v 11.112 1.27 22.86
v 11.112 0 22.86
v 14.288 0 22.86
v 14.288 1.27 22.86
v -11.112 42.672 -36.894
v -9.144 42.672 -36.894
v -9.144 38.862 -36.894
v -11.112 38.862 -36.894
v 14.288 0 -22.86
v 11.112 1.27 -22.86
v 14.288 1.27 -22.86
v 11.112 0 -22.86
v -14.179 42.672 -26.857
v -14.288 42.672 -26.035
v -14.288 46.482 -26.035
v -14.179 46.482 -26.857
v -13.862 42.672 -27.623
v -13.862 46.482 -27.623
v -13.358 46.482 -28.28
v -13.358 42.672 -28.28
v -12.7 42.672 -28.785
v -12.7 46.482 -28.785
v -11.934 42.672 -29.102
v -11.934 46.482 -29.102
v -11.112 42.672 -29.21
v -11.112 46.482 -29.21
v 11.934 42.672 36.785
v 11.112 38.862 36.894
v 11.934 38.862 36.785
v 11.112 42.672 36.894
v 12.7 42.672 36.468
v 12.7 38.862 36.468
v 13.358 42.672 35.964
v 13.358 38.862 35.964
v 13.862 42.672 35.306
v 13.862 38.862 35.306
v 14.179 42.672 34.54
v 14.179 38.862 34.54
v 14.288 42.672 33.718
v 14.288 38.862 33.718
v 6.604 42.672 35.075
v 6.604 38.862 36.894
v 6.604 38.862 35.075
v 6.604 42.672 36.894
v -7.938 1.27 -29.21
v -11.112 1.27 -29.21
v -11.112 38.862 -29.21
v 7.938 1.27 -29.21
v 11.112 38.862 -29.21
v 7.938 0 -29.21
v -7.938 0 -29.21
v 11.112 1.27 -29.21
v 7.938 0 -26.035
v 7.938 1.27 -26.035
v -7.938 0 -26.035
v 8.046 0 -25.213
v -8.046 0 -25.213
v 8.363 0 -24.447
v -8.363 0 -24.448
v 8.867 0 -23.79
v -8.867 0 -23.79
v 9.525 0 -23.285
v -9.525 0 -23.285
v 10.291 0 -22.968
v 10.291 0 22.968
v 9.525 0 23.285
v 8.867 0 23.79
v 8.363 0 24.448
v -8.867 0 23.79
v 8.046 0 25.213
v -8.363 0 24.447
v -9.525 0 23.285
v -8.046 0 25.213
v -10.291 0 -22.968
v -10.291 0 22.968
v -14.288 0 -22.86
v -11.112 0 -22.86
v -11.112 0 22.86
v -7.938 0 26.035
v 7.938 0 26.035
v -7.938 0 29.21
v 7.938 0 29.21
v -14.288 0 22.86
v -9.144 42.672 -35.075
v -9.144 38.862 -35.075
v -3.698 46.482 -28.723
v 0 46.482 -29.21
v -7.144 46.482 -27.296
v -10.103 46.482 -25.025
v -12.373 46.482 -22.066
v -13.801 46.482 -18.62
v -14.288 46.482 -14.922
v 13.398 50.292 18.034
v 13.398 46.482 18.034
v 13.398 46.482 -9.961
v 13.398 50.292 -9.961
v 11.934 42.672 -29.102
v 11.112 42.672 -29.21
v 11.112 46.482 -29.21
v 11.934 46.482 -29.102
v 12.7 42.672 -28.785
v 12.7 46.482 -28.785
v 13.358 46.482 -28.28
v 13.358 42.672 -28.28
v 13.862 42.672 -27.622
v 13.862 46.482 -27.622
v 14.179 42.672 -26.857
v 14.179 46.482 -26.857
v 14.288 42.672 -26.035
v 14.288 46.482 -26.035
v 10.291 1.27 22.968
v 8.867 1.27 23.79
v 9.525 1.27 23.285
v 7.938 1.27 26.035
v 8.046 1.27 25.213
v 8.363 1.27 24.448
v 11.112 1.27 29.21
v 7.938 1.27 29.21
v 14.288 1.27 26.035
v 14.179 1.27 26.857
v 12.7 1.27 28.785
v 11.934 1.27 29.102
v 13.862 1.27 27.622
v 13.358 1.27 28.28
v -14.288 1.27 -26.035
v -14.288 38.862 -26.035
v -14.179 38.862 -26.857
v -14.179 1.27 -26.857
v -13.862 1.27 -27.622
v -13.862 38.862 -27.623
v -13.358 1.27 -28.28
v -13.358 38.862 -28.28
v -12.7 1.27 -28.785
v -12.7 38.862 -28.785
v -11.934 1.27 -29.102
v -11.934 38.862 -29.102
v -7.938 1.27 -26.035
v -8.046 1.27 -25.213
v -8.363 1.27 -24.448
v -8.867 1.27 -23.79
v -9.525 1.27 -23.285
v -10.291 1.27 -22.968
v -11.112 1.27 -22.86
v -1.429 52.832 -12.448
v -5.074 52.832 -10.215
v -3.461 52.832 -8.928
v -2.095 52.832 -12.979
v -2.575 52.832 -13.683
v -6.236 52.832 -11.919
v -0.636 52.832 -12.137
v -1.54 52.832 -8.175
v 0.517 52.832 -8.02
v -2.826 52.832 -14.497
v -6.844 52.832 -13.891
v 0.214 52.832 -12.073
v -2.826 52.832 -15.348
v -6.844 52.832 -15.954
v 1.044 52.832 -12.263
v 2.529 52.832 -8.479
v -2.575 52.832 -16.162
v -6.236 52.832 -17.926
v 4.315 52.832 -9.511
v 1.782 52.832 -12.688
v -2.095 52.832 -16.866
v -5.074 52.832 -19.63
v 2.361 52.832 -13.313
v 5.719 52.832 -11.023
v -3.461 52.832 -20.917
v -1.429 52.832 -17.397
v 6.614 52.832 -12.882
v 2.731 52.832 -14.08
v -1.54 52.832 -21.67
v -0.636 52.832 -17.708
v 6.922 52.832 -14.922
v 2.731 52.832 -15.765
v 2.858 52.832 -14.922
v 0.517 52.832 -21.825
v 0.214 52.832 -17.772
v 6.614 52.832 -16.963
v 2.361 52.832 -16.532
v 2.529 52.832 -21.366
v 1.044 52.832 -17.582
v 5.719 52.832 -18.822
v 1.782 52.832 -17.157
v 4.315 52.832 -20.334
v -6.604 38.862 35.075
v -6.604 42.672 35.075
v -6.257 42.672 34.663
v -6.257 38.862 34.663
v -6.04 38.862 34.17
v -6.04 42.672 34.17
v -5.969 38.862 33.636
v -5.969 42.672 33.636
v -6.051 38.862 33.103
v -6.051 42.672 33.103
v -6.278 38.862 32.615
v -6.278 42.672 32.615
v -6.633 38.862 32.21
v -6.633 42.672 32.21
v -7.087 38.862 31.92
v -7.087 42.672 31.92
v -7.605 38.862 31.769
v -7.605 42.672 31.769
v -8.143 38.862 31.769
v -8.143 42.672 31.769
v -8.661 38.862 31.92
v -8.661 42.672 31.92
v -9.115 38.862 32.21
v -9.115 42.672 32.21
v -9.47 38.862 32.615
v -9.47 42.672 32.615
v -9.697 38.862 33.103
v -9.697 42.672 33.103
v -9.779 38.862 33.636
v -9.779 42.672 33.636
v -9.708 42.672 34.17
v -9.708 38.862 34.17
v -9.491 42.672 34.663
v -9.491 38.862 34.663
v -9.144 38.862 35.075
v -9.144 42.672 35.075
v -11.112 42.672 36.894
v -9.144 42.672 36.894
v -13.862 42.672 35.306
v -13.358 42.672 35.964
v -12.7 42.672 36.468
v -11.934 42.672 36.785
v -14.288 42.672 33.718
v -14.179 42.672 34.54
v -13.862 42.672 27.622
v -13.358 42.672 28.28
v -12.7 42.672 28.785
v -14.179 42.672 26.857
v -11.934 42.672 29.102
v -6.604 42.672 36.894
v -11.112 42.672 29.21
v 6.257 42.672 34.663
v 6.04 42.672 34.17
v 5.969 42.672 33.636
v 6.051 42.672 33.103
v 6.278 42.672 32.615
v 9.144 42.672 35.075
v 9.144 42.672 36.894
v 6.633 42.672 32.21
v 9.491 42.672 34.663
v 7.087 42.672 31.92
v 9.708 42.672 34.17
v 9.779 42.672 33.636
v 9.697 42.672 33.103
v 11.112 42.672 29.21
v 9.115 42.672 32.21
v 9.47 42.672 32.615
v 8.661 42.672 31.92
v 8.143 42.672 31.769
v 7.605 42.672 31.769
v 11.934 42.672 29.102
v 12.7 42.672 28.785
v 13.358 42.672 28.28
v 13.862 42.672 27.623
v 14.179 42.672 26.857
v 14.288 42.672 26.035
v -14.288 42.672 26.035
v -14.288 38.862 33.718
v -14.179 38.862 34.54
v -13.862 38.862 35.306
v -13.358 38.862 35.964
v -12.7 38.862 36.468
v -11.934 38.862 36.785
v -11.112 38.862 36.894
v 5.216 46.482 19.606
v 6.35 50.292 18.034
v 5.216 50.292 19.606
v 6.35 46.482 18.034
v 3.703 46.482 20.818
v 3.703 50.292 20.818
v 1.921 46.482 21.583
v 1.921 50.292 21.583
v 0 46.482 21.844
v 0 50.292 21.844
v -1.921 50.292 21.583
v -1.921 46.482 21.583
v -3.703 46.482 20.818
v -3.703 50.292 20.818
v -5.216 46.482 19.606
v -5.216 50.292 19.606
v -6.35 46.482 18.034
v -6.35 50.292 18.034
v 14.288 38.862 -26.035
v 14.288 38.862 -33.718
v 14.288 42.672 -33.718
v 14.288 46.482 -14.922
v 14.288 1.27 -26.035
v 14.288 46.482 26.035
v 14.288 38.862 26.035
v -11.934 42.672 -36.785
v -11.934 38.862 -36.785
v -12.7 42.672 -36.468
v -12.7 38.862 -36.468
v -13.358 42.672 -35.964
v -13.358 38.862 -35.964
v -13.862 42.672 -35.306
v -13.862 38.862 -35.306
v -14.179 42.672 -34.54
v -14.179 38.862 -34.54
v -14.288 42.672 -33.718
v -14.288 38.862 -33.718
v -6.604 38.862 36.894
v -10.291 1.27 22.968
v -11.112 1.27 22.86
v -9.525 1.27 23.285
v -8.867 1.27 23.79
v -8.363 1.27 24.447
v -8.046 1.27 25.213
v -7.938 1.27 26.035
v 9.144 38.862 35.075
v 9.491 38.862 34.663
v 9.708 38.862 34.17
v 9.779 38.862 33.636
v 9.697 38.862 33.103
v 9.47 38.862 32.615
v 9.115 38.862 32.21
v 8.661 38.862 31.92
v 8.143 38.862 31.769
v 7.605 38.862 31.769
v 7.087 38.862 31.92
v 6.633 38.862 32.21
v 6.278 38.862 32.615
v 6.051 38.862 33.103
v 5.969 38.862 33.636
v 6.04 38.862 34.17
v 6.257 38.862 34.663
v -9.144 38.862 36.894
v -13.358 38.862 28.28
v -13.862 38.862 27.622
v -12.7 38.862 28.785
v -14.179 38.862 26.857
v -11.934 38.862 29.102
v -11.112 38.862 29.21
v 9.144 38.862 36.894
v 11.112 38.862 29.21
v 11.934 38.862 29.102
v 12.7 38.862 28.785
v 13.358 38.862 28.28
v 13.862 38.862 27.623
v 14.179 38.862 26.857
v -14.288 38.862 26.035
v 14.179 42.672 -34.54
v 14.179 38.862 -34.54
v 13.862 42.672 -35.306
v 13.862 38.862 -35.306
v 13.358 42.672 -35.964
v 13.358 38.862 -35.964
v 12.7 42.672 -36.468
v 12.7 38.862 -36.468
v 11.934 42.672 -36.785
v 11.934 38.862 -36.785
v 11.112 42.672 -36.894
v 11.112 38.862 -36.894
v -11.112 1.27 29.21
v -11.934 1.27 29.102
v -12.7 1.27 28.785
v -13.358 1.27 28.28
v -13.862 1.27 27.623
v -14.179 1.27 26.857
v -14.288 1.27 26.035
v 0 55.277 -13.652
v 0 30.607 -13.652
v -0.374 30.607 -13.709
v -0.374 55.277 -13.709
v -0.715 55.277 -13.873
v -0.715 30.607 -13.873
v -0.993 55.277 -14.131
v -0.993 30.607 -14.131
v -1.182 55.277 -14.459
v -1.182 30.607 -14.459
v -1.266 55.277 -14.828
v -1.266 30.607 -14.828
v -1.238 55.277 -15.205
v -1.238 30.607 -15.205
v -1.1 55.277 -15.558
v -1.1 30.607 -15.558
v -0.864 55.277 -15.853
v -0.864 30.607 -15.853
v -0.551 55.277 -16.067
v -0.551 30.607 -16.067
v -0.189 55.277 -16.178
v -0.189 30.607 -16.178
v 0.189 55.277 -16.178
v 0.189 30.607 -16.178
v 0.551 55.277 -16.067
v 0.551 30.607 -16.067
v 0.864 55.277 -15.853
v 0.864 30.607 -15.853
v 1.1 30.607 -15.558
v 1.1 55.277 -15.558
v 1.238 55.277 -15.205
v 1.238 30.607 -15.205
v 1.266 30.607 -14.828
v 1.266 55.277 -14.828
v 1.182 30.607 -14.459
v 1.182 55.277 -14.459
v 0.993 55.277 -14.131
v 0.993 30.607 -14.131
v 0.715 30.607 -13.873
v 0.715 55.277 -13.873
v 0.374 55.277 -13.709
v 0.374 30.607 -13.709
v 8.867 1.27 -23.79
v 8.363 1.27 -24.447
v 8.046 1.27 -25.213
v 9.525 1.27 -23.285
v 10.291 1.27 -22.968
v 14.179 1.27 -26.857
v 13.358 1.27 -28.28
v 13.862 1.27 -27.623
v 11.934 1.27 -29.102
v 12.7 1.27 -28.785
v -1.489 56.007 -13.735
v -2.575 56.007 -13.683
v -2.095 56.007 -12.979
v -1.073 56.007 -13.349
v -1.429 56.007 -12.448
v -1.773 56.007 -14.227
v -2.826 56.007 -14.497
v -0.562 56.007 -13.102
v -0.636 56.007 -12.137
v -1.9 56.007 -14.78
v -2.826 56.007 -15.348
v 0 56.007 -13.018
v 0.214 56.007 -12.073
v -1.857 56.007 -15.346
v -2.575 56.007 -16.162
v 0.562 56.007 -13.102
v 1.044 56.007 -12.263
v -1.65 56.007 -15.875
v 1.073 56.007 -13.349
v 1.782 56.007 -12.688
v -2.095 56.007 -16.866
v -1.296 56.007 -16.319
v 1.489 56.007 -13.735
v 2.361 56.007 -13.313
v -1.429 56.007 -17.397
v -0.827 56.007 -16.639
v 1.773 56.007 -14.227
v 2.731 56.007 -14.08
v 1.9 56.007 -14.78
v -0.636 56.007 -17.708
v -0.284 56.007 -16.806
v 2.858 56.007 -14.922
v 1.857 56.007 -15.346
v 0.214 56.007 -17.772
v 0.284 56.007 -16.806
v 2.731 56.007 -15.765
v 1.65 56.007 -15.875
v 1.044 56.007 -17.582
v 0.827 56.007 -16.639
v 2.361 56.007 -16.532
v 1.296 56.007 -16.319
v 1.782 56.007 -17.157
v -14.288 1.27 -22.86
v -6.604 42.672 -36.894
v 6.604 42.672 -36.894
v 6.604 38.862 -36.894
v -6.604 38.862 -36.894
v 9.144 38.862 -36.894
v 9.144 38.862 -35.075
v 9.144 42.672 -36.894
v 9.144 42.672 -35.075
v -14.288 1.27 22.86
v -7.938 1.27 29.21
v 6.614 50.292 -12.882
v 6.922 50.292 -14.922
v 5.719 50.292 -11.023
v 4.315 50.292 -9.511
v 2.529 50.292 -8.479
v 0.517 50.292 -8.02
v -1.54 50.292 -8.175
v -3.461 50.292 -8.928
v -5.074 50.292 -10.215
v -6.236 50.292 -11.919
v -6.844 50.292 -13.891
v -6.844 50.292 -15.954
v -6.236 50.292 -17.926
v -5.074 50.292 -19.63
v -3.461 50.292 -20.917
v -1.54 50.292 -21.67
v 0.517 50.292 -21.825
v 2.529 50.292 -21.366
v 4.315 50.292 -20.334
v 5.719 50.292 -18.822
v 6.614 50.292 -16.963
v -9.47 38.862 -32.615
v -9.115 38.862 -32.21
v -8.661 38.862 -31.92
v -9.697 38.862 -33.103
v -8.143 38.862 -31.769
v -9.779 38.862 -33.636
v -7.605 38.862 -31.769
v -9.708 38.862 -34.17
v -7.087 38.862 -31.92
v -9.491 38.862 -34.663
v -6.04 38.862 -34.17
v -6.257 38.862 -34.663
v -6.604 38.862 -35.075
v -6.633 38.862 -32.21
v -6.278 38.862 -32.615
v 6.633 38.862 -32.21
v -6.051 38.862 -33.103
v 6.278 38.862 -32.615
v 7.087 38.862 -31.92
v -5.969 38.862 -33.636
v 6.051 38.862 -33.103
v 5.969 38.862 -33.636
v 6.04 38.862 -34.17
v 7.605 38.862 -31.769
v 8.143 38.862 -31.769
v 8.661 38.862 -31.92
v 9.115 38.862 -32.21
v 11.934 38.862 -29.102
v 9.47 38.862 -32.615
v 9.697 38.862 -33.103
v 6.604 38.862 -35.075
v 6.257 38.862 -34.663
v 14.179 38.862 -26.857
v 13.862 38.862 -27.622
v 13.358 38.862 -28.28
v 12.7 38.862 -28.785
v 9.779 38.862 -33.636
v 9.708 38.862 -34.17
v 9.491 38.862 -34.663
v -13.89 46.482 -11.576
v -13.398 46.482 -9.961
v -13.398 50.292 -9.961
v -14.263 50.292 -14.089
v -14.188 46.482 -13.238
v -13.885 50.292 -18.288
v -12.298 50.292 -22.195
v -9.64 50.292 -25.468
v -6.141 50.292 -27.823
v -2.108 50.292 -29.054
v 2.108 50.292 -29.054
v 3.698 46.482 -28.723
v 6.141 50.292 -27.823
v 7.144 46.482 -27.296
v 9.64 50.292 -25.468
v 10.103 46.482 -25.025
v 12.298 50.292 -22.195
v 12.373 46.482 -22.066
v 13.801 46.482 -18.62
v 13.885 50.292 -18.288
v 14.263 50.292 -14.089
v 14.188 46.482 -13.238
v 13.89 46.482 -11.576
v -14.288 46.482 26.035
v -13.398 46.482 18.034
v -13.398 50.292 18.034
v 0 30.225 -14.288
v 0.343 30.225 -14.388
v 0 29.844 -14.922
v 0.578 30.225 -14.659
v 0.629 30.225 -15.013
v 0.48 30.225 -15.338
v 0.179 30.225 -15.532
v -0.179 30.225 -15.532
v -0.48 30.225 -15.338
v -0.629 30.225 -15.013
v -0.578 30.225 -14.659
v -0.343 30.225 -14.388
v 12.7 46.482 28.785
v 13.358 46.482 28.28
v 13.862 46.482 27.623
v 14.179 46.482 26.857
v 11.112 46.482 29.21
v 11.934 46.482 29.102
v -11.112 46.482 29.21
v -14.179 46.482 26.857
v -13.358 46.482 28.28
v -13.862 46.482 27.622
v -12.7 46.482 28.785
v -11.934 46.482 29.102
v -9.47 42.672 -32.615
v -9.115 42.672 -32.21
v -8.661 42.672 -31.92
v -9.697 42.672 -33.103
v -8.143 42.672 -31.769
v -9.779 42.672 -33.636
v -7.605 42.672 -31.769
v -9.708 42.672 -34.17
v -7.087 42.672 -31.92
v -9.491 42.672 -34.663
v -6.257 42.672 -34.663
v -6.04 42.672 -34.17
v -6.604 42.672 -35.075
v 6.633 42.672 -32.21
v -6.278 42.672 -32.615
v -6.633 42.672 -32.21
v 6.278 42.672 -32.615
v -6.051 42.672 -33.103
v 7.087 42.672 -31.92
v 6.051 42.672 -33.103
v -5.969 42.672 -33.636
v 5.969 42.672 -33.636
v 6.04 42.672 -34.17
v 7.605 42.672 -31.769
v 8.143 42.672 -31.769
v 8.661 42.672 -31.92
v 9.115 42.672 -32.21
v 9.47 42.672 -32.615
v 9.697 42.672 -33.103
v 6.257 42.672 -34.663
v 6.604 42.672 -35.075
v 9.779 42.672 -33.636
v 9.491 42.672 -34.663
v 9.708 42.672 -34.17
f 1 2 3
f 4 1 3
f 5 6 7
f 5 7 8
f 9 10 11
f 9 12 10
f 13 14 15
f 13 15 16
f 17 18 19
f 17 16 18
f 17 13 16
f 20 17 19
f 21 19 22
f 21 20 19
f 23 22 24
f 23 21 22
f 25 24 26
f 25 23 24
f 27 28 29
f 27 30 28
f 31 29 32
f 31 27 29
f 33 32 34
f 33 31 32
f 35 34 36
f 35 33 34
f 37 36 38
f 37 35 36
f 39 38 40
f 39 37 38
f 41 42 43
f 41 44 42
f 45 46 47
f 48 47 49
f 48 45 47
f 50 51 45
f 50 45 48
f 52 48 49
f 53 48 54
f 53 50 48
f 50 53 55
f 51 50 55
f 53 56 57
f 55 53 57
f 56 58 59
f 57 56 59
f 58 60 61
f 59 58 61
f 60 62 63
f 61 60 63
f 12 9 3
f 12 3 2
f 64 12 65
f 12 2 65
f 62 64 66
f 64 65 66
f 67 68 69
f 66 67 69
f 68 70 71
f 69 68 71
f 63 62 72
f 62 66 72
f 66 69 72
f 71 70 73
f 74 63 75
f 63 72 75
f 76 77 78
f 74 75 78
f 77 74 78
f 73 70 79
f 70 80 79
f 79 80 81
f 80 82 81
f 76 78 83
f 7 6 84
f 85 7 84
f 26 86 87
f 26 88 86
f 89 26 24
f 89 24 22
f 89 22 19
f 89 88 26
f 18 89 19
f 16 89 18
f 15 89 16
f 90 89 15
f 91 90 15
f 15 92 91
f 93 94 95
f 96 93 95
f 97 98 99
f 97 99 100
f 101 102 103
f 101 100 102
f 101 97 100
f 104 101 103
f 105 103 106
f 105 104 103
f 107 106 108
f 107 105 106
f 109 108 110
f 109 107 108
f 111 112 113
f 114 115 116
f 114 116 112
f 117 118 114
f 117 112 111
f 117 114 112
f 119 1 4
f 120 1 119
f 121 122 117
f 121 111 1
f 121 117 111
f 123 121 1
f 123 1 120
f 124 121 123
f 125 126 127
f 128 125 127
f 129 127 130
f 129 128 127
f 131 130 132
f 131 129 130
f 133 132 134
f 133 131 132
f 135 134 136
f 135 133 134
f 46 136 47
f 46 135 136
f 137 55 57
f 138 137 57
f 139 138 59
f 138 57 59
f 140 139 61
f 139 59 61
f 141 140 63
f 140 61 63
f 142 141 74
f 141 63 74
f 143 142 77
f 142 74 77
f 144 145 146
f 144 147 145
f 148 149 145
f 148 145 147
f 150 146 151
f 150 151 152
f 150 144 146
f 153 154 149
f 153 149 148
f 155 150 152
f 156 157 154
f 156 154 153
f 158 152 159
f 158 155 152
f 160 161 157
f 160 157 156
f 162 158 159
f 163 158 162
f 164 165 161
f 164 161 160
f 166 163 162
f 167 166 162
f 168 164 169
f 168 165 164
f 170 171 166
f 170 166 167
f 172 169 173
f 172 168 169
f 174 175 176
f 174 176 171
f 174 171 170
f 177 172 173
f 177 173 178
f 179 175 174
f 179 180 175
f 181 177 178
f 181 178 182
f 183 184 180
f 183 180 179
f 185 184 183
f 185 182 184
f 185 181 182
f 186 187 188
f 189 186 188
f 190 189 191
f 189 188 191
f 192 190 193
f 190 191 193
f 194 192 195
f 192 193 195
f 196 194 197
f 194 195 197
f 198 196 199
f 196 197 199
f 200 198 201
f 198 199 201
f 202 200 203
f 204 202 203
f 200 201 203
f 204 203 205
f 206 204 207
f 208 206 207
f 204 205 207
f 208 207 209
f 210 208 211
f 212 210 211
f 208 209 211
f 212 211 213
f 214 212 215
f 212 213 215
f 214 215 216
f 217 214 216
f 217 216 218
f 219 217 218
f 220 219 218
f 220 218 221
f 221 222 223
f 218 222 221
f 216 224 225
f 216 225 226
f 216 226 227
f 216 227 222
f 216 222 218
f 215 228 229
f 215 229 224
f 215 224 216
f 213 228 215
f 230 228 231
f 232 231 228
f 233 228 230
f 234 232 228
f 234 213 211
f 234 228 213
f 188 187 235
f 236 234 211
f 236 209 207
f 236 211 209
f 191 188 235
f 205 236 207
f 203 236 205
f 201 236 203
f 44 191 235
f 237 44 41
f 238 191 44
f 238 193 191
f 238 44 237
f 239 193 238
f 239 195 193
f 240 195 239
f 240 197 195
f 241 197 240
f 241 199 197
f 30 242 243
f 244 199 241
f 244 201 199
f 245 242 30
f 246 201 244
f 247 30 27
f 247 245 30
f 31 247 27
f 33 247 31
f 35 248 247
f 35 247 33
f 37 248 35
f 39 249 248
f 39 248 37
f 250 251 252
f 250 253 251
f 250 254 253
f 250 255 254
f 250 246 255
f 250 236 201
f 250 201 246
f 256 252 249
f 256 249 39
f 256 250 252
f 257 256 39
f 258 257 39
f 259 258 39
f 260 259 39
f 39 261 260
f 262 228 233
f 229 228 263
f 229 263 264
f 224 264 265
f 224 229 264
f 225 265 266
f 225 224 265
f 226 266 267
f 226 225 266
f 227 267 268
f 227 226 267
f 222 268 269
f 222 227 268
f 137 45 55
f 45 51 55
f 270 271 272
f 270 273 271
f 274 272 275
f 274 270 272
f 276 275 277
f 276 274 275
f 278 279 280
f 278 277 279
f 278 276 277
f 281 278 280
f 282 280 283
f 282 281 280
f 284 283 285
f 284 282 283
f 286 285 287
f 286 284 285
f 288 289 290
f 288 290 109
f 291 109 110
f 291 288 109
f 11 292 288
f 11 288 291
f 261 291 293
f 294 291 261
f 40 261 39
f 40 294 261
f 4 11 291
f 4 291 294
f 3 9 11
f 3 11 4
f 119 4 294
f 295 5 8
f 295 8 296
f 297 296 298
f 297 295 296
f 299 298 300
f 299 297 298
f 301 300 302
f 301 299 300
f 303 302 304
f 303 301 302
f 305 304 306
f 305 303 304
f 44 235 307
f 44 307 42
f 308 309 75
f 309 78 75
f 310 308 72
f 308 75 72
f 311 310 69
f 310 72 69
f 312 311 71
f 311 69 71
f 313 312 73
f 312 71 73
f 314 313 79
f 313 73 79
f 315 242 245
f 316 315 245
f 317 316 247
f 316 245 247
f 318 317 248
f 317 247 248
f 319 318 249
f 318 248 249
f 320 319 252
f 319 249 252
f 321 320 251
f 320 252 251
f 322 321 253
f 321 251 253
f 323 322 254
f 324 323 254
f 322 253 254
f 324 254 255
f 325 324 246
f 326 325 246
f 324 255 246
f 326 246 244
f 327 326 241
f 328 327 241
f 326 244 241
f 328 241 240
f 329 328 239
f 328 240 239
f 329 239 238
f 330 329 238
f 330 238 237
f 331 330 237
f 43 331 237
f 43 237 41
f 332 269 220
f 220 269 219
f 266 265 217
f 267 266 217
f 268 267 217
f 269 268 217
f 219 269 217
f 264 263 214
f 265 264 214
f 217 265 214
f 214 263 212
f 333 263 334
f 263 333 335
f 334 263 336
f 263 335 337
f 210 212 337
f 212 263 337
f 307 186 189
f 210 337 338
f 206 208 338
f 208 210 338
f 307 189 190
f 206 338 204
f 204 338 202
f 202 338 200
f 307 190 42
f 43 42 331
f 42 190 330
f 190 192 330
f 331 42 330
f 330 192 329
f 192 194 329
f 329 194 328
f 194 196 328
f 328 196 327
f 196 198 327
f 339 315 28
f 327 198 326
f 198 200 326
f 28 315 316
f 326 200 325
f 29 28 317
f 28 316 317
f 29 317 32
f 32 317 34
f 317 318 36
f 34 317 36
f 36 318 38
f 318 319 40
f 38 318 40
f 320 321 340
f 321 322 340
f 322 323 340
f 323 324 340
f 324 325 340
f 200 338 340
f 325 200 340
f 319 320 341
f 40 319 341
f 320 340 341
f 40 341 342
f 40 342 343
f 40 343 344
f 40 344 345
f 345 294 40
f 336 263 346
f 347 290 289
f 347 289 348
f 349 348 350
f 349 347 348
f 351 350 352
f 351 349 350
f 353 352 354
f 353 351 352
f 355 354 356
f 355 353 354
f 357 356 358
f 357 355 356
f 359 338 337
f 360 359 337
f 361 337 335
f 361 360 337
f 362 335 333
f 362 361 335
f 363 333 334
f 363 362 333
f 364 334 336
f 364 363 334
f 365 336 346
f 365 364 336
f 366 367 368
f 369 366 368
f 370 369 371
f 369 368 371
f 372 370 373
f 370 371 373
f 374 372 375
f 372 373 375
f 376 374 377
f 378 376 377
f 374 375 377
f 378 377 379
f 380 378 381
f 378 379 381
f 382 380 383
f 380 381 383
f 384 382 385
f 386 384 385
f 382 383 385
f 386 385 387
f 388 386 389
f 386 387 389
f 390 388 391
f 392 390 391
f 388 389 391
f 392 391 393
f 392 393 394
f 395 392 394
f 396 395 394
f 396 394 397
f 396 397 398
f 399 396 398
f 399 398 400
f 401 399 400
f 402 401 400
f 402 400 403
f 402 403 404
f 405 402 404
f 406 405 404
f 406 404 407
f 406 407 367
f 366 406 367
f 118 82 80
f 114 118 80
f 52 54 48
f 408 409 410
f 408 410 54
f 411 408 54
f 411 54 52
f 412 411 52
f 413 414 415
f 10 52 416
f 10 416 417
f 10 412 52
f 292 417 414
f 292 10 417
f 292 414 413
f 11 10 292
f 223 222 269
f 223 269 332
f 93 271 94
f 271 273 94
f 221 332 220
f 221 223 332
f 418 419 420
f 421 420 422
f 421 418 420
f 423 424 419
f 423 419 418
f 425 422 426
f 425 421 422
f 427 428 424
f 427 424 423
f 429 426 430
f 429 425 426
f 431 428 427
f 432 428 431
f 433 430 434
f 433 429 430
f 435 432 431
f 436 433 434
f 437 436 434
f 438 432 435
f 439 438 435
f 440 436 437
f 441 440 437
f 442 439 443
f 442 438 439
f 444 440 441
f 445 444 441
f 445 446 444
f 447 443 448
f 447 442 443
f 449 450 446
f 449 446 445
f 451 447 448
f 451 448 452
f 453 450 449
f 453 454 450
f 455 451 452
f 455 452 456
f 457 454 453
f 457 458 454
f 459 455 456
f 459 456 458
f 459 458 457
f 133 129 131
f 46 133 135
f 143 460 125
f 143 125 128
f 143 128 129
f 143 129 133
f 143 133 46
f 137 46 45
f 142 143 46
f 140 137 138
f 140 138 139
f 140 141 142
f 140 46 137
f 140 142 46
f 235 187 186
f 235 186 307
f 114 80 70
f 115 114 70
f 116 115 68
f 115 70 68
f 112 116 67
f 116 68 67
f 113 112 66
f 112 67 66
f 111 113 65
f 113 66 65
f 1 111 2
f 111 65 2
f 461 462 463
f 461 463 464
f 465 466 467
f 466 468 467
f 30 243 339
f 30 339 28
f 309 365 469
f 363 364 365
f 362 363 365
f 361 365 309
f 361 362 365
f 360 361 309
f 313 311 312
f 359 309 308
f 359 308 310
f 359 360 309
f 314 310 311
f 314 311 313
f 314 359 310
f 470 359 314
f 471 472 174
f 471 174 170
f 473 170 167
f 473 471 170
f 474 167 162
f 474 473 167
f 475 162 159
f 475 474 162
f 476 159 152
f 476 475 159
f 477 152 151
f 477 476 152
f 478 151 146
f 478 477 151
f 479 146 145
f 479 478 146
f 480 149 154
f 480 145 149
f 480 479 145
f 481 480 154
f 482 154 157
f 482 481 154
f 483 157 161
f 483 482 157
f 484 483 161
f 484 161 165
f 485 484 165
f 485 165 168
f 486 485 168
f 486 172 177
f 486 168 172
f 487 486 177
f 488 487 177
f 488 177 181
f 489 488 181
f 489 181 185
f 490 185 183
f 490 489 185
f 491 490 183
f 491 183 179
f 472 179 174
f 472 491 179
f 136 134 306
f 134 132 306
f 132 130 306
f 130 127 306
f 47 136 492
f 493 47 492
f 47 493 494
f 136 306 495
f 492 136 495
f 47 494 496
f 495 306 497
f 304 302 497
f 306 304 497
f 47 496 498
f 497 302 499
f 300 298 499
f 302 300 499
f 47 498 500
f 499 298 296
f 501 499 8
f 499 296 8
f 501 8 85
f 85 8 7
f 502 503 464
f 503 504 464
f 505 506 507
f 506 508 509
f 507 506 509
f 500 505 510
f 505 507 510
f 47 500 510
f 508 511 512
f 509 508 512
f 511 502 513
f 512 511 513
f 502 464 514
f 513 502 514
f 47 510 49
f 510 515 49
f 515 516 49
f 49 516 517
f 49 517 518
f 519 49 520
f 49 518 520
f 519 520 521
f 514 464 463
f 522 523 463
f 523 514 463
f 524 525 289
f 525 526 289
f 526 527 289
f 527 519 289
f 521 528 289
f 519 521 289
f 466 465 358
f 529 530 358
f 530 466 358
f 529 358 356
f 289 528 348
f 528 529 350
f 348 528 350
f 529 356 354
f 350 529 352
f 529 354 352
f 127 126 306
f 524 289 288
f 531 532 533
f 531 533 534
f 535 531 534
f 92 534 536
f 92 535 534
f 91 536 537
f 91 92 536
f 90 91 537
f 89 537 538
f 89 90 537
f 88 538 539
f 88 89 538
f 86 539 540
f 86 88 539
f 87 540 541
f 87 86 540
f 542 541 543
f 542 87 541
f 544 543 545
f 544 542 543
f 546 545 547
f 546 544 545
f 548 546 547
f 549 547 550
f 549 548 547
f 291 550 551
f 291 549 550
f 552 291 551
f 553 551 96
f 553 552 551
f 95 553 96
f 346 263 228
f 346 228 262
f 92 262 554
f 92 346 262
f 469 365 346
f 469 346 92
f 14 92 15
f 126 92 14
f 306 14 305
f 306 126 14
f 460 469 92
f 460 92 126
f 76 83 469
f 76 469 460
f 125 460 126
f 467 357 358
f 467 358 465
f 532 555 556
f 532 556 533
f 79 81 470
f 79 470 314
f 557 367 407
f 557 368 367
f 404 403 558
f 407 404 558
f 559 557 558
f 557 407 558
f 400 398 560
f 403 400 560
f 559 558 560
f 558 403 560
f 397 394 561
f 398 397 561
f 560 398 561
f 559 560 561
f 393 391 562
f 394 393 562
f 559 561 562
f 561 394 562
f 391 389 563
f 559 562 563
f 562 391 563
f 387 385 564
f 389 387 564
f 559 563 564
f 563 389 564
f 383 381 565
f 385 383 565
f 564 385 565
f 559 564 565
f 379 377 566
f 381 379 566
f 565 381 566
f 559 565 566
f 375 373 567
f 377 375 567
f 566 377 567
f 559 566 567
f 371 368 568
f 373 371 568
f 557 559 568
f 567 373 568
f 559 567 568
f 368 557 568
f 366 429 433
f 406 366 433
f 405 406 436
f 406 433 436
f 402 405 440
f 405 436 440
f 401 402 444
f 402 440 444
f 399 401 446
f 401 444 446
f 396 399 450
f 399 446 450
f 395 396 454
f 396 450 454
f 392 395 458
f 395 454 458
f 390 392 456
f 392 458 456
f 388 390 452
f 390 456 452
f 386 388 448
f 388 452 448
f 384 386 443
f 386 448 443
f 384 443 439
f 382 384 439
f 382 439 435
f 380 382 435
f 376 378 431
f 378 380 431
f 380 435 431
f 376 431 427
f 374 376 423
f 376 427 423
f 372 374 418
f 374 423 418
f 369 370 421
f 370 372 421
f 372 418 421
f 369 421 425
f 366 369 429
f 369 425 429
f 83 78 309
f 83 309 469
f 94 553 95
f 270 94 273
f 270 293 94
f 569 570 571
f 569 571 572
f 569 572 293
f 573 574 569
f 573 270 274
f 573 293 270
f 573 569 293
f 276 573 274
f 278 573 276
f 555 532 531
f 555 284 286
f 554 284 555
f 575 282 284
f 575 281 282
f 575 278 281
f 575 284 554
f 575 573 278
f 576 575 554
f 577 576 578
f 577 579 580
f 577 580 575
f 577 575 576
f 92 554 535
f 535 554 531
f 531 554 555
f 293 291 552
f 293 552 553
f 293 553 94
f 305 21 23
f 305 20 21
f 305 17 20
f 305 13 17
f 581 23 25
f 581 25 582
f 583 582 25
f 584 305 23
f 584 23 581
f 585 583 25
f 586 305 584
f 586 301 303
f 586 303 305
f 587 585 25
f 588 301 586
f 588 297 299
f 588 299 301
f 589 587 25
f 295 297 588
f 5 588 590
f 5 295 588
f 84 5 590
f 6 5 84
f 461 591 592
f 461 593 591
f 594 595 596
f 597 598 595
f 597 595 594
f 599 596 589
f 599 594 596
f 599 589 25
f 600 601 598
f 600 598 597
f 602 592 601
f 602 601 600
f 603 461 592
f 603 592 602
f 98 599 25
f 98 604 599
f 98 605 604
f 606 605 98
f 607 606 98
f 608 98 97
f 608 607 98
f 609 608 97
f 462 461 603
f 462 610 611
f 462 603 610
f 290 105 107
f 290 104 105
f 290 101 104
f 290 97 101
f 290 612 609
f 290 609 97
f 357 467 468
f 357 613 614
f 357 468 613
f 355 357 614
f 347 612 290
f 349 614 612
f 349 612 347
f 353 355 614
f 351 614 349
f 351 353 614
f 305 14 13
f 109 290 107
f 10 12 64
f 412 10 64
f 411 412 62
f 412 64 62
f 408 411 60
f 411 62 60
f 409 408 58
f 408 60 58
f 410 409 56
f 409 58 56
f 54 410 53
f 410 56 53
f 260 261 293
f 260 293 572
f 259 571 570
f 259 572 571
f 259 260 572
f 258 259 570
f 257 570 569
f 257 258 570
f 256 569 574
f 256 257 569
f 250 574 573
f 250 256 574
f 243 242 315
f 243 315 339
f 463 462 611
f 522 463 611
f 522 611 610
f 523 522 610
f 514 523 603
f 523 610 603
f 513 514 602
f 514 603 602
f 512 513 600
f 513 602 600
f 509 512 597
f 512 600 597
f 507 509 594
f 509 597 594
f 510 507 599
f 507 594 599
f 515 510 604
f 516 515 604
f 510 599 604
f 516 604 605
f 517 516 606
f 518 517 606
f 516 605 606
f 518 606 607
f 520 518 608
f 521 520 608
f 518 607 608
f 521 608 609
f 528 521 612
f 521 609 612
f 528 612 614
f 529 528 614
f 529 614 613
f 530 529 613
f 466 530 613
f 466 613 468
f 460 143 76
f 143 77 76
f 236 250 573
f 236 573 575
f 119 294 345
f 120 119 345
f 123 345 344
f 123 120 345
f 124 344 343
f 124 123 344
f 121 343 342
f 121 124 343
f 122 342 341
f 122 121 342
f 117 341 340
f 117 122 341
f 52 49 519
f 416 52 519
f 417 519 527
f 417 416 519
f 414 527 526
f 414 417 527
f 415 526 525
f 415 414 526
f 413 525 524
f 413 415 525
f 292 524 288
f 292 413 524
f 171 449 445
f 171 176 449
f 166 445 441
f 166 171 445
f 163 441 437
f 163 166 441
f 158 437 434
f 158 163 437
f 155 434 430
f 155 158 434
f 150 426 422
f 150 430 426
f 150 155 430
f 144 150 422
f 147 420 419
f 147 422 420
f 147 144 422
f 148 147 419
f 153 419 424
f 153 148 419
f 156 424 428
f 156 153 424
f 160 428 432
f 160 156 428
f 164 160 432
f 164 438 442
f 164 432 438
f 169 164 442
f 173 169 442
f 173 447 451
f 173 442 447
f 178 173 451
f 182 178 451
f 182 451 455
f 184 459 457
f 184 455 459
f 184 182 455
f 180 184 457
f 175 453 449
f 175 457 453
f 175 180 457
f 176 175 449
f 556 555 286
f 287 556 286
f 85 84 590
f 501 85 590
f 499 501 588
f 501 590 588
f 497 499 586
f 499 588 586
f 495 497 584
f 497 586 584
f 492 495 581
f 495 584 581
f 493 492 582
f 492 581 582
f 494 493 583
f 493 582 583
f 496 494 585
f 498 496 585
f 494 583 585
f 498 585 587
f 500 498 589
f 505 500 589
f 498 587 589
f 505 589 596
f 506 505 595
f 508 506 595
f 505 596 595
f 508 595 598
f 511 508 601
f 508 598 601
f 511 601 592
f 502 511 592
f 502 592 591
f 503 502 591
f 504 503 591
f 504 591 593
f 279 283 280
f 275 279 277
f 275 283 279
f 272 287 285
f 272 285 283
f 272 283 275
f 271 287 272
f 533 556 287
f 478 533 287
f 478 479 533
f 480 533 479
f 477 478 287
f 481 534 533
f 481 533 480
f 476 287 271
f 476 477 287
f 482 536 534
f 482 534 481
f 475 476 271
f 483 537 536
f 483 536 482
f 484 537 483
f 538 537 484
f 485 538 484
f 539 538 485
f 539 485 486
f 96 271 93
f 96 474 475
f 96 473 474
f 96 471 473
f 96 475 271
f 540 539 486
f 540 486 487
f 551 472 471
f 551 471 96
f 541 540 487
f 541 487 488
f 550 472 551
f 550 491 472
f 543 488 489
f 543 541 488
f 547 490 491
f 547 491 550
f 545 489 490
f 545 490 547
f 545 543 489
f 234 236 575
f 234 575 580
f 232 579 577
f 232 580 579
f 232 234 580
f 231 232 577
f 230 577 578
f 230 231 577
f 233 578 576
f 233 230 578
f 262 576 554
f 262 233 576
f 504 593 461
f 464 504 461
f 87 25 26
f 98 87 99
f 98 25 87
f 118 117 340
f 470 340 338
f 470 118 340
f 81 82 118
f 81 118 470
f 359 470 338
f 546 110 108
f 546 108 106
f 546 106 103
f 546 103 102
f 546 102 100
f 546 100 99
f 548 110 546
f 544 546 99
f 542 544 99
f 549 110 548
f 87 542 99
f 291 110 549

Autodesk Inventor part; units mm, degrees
ref_plane "YZ Plane" through (0, 0, 0) normal (1, 0, 0) x (0, 1, 0)
ref_plane "XZ Plane" through (0, 0, 0) normal (0, 1, 0) x (-1, 0, 0)
sketch "Sketch1" plane through (0, 0, 0) normal (0, 1, 0) x (-1, 0, 0)
  line L0 (-11.1125, 29.21) -> (11.1125, 29.21)
  line L1 (14.2875, 26.035) -> (14.2875, -26.035)
  line L2 (11.1125, -29.21) -> (-11.1125, -29.21)
  line L3 (-14.2875, -26.035) -> (-14.2875, 26.035)
  line L4 (-14.2875, 29.21) -> (14.2875, -29.21) construction
  line L5 (14.2875, 29.21) -> (-14.2875, -29.21) construction
  arc A0 (14.2875, 26.035) -> (11.1125, 29.21) centre (11.1125, 26.035) ccw
  arc A1 (-11.1125, 29.21) -> (-14.2875, 26.035) centre (-11.1125, 26.035) ccw
  arc A2 (-14.2875, -26.035) -> (-11.1125, -29.21) centre (-11.1125, -26.035) ccw
  arc A3 (11.1125, -29.21) -> (14.2875, -26.035) centre (11.1125, -26.035) ccw
  point P0 (0, 0)
  dimension "d0" = 28.575
  dimension "d1" = 58.42
  dimension "d2" = 3.175
extrude "Extrusion1" add sketch "Sketch1" along normal blind 46.482
ref_plane "Work Plane1" through (0, 42.672, 0) normal (0, 1, 0) x (1, 0, 0)
sketch "Sketch2" plane through (0, 42.672, 0) normal (0, 1, 0) x (1, 0, 0)
  arc A0 (-11.1125, 29.21) -> (-14.2875, 26.035) centre (-11.1125, 26.035) ccw projected
  line L0 (-11.1125, 29.21) -> (11.1125, 29.21) projected
  arc A1 (14.2875, 26.035) -> (11.1125, 29.21) centre (11.1125, 26.035) ccw projected
  line L1 (14.2875, 26.035) -> (14.2875, -26.035) projected
  arc A2 (11.1125, -29.21) -> (14.2875, -26.035) centre (11.1125, -26.035) ccw projected
  line L2 (11.1125, -29.21) -> (-11.1125, -29.21) projected
  arc A3 (-14.2875, -26.035) -> (-11.1125, -29.21) centre (-11.1125, -26.035) ccw projected
  line L3 (-14.2875, -26.035) -> (-14.2875, 26.035) projected
  line L4 (-11.1125, -36.8935) -> (11.1125, -36.8935)
  line L5 (14.2875, -33.7185) -> (14.2875, 33.7185)
  line L6 (11.1125, 36.8935) -> (-6.604, 36.8935)
  line L7 (-14.2875, 33.7185) -> (-14.2875, -33.7185)
  line L8 (-14.2875, -36.8935) -> (14.2875, 36.8935) construction
  line L9 (14.2875, -36.8935) -> (-14.2875, 36.8935) construction
  arc A4 (-11.1125, 36.8935) -> (-14.2875, 33.7185) centre (-11.1125, 33.7185) ccw
  arc A5 (14.2875, 33.7185) -> (11.1125, 36.8935) centre (11.1125, 33.7185) ccw
  arc A6 (11.1125, -36.8935) -> (14.2875, -33.7185) centre (11.1125, -33.7185) ccw
  arc A7 (-14.2875, -33.7185) -> (-11.1125, -36.8935) centre (-11.1125, -33.7185) ccw
  line L10 (-7.874, -33.655) -> (7.874, -33.655) construction
  line L11 (7.874, -33.655) -> (7.874, 33.655) construction
  line L12 (7.874, 33.655) -> (-7.874, 33.655) construction
  line L13 (-7.874, 33.655) -> (-7.874, -33.655) construction
  line L14 (-7.874, -33.655) -> (7.874, 33.655) construction
  line L15 (7.874, -33.655) -> (-7.874, 33.655) construction
  arc A8 (-9.144, 35.0749) -> (-6.604, 35.0749) centre (-7.874, 33.655) ccw
  line L16 (-9.144, 32.385) -> (-6.604, 32.385) construction
  line L17 (-6.604, 32.385) -> (-6.604, 34.925) construction
  line L18 (-6.604, 34.925) -> (-9.144, 34.925) construction
  line L19 (-9.144, 34.925) -> (-9.144, 32.385) construction
  line L20 (-9.144, 32.385) -> (-6.604, 34.925) construction
  line L21 (-6.604, 32.385) -> (-9.144, 34.925) construction
  line L22 (-9.144, 34.925) -> (-6.604, 34.925) construction
  line L23 (-6.604, 34.925) -> (-6.604, 36.8935)
  line L24 (-6.604, 36.8935) -> (-9.144, 36.8935)
  line L25 (-9.144, 36.8935) -> (-9.144, 34.925)
  arc A9 (-6.604, 35.0749) -> (-9.144, 35.0749) centre (-7.874, 33.655) ccw construction
  line L26 (-9.144, 36.8935) -> (-11.1125, 36.8935)
  line L27 (-6.604, 36.8935) -> (-9.144, 36.8935) construction
  arc A10 (6.604, 35.0749) -> (9.144, 35.0749) centre (7.874, 33.655) ccw
  line L28 (6.604, 36.8935) -> (6.604, 34.925)
  line L29 (9.144, 34.925) -> (9.144, 36.8935)
  line L30 (-14.2875, 0) -> (14.2875, 0) construction
  arc A11 (-6.604, -35.0749) -> (-9.144, -35.0749) centre (-7.874, -33.655) ccw
  line L31 (-6.604, -34.925) -> (-6.604, -36.8935)
  line L32 (-9.144, -36.8935) -> (-9.144, -34.925)
  arc A12 (9.144, -35.0749) -> (6.604, -35.0749) centre (7.874, -33.655) ccw
  line L33 (6.604, -36.8935) -> (6.604, -34.925)
  line L34 (9.144, -34.925) -> (9.144, -36.8935)
  line L35 (6.604, 36.8935) -> (9.144, 36.8935) construction
  line L36 (6.604, -36.8935) -> (9.144, -36.8935) construction
  line L37 (-9.144, -36.8935) -> (-6.604, -36.8935) construction
  line L38 (6.604, 36.8935) -> (9.144, 36.8935)
  line L39 (6.604, -36.8935) -> (9.144, -36.8935)
  line L40 (-9.144, -36.8935) -> (-6.604, -36.8935)
  point P0 (0, 0)
  dimension "d6" = 73.787
  dimension "d7" = 3.175
  dimension "d10" = 15.748
  dimension "d11" = 67.31
  dimension "d12" = 3.81
  dimension "d16" = 2.54
  dimension "d17" = 2.54
  dimension "d20" = 15.748
extrude "Extrusion2" add sketch "Sketch2" against normal blind 3.81 contours A0 L7 A4 L26 L25 A8 L23 L6 L28 A10 L29 A5 L5 A1 L0 | A3 L2 A2 L5 A6 L4 L34 A12 L33 L31 A11 L32 A7 L7 | L24 L23 A8 L25 | L32 A11 L31 L4 | L29 A10 L28 L6 | L4 L33 A12 L34
extrude "Extrusion3" cut sketch "Sketch2" against normal through all contours L24 L23 A8 L25 | L32 A11 L31 L4 | L29 A10 L28 L6 | L4 L33 A12 L34
sketch "Sketch3" plane through (0, 46.482, 0) normal (0, 1, 0) x (1, 0, 0)
  line L0 (-14.2875, 26.035) -> (-14.2875, -26.035) construction
  arc A0 (-14.2875, -26.035) -> (-11.1125, -29.21) centre (-11.1125, -26.035) ccw construction
  line L1 (-11.1125, -29.21) -> (11.1125, -29.21) construction
  arc A1 (11.1125, -29.21) -> (14.2875, -26.035) centre (11.1125, -26.035) ccw construction
  line L2 (14.2875, -26.035) -> (14.2875, 26.035) construction
  arc A2 (14.2875, 26.035) -> (11.1125, 29.21) centre (11.1125, 26.035) ccw construction
  line L3 (11.1125, 29.21) -> (-11.1125, 29.21) construction
  arc A3 (-11.1125, 29.21) -> (-14.2875, 26.035) centre (-11.1125, 26.035) ccw construction
  circle A4 centre (0, 14.9225) radius 14.2875
  line L4 (-13.3985, -18.034) -> (-13.3985, 9.9614)
  line L5 (13.3985, -18.034) -> (13.3985, 9.9614)
  line L6 (-13.3985, -18.034) -> (13.3985, -18.034)
  circle A5 centre (0, -18.034) radius 6.35 construction
  line L7 (0, -18.034) -> (0, -21.844) construction
  arc A6 (-6.35, -18.034) -> (6.35, -18.034) centre (0, -14.6473) ccw
  point P0 (0, 0)
  dimension "d27" = 0.889
  dimension "d28" = 0.889
  dimension "d29" = 47.244
  dimension "d30" = 12.7
  dimension "d31" = 3.81
extrude "Extrusion4" add sketch "Sketch3" along normal blind 3.81
sketch "Sketch4" plane through (0, 50.292, 0) normal (0, 1, 0) x (1, 0, 0)
  arc A0 (13.3985, 9.9614) -> (-13.3985, 9.9614) centre (0, 14.9225) ccw construction
  circle A1 centre (0, 14.9225) radius 6.9215
  point P0 (0, 0)
  dimension "d34" = 13.843
extrude "Extrusion5" add sketch "Sketch4" along normal blind 2.54
sketch "Sketch5" plane through (0, 50.292, 0) normal (0, 1, 0) x (1, 0, 0)
  circle A0 centre (0, 14.9225) radius 6.9215 construction
  arc A1 (-6.35, -18.034) -> (6.35, -18.034) centre (0, -14.6473) ccw construction
  line L0 (6.35, -18.034) -> (13.3985, -18.034) construction
  line L1 (13.3985, -18.034) -> (13.3985, 9.9614) construction
  arc A2 (13.3985, 9.9614) -> (-13.3985, 9.9614) centre (0, 14.9225) ccw construction
  line L2 (-13.3985, 9.9614) -> (-13.3985, -18.034) construction
  line L3 (-13.3985, -18.034) -> (-6.35, -18.034) construction
  line L4 (-9.906, -2.159) -> (9.9036, -2.159) construction
  line L5 (9.9036, -2.159) -> (9.9036, -14.859) construction
  line L6 (9.9036, -14.859) -> (-9.906, -14.859) construction
  line L7 (-9.906, -14.859) -> (-9.906, -2.159) construction
  point P0 (0, 0)
  dimension "d53" = 12.7
  dimension "d59" = 3.175
  dimension "d60" = 3.4925
  dimension "d61" = 3.4949
decal "Decal1"
sketch "Sketch6" plane through (0, 52.832, -14.9225) normal (0, 1, 0) x (1, 0, 0)
  circle A0 centre (0, 0) radius 6.9215 construction
  circle A1 centre (0, 0) radius 2.8575
  point P0 (0, -14.9225)
  dimension "d62" = 5.715
extrude "Extrusion6" add sketch "Sketch6" along normal blind 3.175
hole "Hole1" at (0, 56.007, -14.9225) direction (0, -1, 0) diameter 2.54 depth 25.4 tip angle 118 countersink diameter 3.81 countersink angle 82
sketch "Sketch7" plane through (0, 0, 0) normal (0, -1, 0) x (1, 0, 0)
  line L0 (-14.2875, 26.035) -> (-14.2875, -26.035) construction
  arc A0 (-14.2875, -26.035) -> (-11.1125, -29.21) centre (-11.1125, -26.035) ccw construction
  line L1 (-11.1125, -29.21) -> (11.1125, -29.21) construction
  arc A1 (11.1125, -29.21) -> (14.2875, -26.035) centre (11.1125, -26.035) ccw construction
  line L2 (14.2875, -26.035) -> (14.2875, 26.035) construction
  arc A2 (14.2875, 26.035) -> (11.1125, 29.21) centre (11.1125, 26.035) ccw construction
  line L3 (11.1125, 29.21) -> (-11.1125, 29.21) construction
  arc A3 (-11.1125, 29.21) -> (-14.2875, 26.035) centre (-11.1125, 26.035) ccw construction
  line L4 (-14.2875, 26.035) -> (-14.2875, 33.7185) construction
  line L5 (14.2875, -26.035) -> (14.2875, -33.7185) construction
  line L6 (-14.2875, 29.21) -> (14.2875, 29.21) construction
  line L7 (14.2875, 29.21) -> (14.2875, -29.21) construction
  line L8 (14.2875, -29.21) -> (-14.2875, -29.21) construction
  line L9 (-14.2875, -29.21) -> (-14.2875, 29.21) construction
  line L10 (-11.1125, 22.86) -> (-14.2875, 22.86)
  line L11 (-14.2875, 22.86) -> (-14.2875, 29.21)
  line L12 (-14.2875, 29.21) -> (-7.9375, 29.21)
  line L13 (-7.9375, 29.21) -> (-7.9375, 26.035)
  line L14 (-7.9375, 22.86) -> (-14.2875, 29.21) construction
  line L15 (-14.2875, 22.86) -> (-7.9375, 29.21) construction
  line L16 (11.1125, 22.86) -> (14.2875, 22.86)
  line L17 (14.2875, 22.86) -> (14.2875, 29.21)
  line L18 (14.2875, 29.21) -> (7.9375, 29.21)
  line L19 (7.9375, 29.21) -> (7.9375, 26.035)
  line L20 (7.9375, 22.86) -> (14.2875, 29.21) construction
  line L21 (14.2875, 22.86) -> (7.9375, 29.21) construction
  line L22 (-11.1125, -22.86) -> (-14.2875, -22.86)
  line L23 (-14.2875, -22.86) -> (-14.2875, -29.21)
  line L24 (-14.2875, -29.21) -> (-7.9375, -29.21)
  line L25 (-7.9375, -29.21) -> (-7.9375, -26.035)
  line L26 (-7.9375, -22.86) -> (-14.2875, -29.21) construction
  line L27 (-14.2875, -22.86) -> (-7.9375, -29.21) construction
  line L28 (11.1125, -22.86) -> (14.2875, -22.86)
  line L29 (14.2875, -22.86) -> (14.2875, -29.21)
  line L30 (14.2875, -29.21) -> (7.9375, -29.21)
  line L31 (7.9375, -29.21) -> (7.9375, -26.035)
  line L32 (7.9375, -22.86) -> (14.2875, -29.21) construction
  line L33 (14.2875, -22.86) -> (7.9375, -29.21) construction
  arc A4 (-11.1125, 22.86) -> (-7.9375, 26.035) centre (-11.1125, 26.035) ccw
  arc A5 (7.9375, 26.035) -> (11.1125, 22.86) centre (11.1125, 26.035) ccw
  arc A6 (-7.9375, -26.035) -> (-11.1125, -22.86) centre (-11.1125, -26.035) ccw
  arc A7 (11.1125, -22.86) -> (7.9375, -26.035) centre (11.1125, -26.035) ccw
  point P0 (0, 0)
  dimension "d76" = 3.175
extrude "Extrusion7" cut sketch "Sketch7" against normal blind 1.27
properties part number "HS-785HB-1111-2017" material "Plastic, Opaque Black"
